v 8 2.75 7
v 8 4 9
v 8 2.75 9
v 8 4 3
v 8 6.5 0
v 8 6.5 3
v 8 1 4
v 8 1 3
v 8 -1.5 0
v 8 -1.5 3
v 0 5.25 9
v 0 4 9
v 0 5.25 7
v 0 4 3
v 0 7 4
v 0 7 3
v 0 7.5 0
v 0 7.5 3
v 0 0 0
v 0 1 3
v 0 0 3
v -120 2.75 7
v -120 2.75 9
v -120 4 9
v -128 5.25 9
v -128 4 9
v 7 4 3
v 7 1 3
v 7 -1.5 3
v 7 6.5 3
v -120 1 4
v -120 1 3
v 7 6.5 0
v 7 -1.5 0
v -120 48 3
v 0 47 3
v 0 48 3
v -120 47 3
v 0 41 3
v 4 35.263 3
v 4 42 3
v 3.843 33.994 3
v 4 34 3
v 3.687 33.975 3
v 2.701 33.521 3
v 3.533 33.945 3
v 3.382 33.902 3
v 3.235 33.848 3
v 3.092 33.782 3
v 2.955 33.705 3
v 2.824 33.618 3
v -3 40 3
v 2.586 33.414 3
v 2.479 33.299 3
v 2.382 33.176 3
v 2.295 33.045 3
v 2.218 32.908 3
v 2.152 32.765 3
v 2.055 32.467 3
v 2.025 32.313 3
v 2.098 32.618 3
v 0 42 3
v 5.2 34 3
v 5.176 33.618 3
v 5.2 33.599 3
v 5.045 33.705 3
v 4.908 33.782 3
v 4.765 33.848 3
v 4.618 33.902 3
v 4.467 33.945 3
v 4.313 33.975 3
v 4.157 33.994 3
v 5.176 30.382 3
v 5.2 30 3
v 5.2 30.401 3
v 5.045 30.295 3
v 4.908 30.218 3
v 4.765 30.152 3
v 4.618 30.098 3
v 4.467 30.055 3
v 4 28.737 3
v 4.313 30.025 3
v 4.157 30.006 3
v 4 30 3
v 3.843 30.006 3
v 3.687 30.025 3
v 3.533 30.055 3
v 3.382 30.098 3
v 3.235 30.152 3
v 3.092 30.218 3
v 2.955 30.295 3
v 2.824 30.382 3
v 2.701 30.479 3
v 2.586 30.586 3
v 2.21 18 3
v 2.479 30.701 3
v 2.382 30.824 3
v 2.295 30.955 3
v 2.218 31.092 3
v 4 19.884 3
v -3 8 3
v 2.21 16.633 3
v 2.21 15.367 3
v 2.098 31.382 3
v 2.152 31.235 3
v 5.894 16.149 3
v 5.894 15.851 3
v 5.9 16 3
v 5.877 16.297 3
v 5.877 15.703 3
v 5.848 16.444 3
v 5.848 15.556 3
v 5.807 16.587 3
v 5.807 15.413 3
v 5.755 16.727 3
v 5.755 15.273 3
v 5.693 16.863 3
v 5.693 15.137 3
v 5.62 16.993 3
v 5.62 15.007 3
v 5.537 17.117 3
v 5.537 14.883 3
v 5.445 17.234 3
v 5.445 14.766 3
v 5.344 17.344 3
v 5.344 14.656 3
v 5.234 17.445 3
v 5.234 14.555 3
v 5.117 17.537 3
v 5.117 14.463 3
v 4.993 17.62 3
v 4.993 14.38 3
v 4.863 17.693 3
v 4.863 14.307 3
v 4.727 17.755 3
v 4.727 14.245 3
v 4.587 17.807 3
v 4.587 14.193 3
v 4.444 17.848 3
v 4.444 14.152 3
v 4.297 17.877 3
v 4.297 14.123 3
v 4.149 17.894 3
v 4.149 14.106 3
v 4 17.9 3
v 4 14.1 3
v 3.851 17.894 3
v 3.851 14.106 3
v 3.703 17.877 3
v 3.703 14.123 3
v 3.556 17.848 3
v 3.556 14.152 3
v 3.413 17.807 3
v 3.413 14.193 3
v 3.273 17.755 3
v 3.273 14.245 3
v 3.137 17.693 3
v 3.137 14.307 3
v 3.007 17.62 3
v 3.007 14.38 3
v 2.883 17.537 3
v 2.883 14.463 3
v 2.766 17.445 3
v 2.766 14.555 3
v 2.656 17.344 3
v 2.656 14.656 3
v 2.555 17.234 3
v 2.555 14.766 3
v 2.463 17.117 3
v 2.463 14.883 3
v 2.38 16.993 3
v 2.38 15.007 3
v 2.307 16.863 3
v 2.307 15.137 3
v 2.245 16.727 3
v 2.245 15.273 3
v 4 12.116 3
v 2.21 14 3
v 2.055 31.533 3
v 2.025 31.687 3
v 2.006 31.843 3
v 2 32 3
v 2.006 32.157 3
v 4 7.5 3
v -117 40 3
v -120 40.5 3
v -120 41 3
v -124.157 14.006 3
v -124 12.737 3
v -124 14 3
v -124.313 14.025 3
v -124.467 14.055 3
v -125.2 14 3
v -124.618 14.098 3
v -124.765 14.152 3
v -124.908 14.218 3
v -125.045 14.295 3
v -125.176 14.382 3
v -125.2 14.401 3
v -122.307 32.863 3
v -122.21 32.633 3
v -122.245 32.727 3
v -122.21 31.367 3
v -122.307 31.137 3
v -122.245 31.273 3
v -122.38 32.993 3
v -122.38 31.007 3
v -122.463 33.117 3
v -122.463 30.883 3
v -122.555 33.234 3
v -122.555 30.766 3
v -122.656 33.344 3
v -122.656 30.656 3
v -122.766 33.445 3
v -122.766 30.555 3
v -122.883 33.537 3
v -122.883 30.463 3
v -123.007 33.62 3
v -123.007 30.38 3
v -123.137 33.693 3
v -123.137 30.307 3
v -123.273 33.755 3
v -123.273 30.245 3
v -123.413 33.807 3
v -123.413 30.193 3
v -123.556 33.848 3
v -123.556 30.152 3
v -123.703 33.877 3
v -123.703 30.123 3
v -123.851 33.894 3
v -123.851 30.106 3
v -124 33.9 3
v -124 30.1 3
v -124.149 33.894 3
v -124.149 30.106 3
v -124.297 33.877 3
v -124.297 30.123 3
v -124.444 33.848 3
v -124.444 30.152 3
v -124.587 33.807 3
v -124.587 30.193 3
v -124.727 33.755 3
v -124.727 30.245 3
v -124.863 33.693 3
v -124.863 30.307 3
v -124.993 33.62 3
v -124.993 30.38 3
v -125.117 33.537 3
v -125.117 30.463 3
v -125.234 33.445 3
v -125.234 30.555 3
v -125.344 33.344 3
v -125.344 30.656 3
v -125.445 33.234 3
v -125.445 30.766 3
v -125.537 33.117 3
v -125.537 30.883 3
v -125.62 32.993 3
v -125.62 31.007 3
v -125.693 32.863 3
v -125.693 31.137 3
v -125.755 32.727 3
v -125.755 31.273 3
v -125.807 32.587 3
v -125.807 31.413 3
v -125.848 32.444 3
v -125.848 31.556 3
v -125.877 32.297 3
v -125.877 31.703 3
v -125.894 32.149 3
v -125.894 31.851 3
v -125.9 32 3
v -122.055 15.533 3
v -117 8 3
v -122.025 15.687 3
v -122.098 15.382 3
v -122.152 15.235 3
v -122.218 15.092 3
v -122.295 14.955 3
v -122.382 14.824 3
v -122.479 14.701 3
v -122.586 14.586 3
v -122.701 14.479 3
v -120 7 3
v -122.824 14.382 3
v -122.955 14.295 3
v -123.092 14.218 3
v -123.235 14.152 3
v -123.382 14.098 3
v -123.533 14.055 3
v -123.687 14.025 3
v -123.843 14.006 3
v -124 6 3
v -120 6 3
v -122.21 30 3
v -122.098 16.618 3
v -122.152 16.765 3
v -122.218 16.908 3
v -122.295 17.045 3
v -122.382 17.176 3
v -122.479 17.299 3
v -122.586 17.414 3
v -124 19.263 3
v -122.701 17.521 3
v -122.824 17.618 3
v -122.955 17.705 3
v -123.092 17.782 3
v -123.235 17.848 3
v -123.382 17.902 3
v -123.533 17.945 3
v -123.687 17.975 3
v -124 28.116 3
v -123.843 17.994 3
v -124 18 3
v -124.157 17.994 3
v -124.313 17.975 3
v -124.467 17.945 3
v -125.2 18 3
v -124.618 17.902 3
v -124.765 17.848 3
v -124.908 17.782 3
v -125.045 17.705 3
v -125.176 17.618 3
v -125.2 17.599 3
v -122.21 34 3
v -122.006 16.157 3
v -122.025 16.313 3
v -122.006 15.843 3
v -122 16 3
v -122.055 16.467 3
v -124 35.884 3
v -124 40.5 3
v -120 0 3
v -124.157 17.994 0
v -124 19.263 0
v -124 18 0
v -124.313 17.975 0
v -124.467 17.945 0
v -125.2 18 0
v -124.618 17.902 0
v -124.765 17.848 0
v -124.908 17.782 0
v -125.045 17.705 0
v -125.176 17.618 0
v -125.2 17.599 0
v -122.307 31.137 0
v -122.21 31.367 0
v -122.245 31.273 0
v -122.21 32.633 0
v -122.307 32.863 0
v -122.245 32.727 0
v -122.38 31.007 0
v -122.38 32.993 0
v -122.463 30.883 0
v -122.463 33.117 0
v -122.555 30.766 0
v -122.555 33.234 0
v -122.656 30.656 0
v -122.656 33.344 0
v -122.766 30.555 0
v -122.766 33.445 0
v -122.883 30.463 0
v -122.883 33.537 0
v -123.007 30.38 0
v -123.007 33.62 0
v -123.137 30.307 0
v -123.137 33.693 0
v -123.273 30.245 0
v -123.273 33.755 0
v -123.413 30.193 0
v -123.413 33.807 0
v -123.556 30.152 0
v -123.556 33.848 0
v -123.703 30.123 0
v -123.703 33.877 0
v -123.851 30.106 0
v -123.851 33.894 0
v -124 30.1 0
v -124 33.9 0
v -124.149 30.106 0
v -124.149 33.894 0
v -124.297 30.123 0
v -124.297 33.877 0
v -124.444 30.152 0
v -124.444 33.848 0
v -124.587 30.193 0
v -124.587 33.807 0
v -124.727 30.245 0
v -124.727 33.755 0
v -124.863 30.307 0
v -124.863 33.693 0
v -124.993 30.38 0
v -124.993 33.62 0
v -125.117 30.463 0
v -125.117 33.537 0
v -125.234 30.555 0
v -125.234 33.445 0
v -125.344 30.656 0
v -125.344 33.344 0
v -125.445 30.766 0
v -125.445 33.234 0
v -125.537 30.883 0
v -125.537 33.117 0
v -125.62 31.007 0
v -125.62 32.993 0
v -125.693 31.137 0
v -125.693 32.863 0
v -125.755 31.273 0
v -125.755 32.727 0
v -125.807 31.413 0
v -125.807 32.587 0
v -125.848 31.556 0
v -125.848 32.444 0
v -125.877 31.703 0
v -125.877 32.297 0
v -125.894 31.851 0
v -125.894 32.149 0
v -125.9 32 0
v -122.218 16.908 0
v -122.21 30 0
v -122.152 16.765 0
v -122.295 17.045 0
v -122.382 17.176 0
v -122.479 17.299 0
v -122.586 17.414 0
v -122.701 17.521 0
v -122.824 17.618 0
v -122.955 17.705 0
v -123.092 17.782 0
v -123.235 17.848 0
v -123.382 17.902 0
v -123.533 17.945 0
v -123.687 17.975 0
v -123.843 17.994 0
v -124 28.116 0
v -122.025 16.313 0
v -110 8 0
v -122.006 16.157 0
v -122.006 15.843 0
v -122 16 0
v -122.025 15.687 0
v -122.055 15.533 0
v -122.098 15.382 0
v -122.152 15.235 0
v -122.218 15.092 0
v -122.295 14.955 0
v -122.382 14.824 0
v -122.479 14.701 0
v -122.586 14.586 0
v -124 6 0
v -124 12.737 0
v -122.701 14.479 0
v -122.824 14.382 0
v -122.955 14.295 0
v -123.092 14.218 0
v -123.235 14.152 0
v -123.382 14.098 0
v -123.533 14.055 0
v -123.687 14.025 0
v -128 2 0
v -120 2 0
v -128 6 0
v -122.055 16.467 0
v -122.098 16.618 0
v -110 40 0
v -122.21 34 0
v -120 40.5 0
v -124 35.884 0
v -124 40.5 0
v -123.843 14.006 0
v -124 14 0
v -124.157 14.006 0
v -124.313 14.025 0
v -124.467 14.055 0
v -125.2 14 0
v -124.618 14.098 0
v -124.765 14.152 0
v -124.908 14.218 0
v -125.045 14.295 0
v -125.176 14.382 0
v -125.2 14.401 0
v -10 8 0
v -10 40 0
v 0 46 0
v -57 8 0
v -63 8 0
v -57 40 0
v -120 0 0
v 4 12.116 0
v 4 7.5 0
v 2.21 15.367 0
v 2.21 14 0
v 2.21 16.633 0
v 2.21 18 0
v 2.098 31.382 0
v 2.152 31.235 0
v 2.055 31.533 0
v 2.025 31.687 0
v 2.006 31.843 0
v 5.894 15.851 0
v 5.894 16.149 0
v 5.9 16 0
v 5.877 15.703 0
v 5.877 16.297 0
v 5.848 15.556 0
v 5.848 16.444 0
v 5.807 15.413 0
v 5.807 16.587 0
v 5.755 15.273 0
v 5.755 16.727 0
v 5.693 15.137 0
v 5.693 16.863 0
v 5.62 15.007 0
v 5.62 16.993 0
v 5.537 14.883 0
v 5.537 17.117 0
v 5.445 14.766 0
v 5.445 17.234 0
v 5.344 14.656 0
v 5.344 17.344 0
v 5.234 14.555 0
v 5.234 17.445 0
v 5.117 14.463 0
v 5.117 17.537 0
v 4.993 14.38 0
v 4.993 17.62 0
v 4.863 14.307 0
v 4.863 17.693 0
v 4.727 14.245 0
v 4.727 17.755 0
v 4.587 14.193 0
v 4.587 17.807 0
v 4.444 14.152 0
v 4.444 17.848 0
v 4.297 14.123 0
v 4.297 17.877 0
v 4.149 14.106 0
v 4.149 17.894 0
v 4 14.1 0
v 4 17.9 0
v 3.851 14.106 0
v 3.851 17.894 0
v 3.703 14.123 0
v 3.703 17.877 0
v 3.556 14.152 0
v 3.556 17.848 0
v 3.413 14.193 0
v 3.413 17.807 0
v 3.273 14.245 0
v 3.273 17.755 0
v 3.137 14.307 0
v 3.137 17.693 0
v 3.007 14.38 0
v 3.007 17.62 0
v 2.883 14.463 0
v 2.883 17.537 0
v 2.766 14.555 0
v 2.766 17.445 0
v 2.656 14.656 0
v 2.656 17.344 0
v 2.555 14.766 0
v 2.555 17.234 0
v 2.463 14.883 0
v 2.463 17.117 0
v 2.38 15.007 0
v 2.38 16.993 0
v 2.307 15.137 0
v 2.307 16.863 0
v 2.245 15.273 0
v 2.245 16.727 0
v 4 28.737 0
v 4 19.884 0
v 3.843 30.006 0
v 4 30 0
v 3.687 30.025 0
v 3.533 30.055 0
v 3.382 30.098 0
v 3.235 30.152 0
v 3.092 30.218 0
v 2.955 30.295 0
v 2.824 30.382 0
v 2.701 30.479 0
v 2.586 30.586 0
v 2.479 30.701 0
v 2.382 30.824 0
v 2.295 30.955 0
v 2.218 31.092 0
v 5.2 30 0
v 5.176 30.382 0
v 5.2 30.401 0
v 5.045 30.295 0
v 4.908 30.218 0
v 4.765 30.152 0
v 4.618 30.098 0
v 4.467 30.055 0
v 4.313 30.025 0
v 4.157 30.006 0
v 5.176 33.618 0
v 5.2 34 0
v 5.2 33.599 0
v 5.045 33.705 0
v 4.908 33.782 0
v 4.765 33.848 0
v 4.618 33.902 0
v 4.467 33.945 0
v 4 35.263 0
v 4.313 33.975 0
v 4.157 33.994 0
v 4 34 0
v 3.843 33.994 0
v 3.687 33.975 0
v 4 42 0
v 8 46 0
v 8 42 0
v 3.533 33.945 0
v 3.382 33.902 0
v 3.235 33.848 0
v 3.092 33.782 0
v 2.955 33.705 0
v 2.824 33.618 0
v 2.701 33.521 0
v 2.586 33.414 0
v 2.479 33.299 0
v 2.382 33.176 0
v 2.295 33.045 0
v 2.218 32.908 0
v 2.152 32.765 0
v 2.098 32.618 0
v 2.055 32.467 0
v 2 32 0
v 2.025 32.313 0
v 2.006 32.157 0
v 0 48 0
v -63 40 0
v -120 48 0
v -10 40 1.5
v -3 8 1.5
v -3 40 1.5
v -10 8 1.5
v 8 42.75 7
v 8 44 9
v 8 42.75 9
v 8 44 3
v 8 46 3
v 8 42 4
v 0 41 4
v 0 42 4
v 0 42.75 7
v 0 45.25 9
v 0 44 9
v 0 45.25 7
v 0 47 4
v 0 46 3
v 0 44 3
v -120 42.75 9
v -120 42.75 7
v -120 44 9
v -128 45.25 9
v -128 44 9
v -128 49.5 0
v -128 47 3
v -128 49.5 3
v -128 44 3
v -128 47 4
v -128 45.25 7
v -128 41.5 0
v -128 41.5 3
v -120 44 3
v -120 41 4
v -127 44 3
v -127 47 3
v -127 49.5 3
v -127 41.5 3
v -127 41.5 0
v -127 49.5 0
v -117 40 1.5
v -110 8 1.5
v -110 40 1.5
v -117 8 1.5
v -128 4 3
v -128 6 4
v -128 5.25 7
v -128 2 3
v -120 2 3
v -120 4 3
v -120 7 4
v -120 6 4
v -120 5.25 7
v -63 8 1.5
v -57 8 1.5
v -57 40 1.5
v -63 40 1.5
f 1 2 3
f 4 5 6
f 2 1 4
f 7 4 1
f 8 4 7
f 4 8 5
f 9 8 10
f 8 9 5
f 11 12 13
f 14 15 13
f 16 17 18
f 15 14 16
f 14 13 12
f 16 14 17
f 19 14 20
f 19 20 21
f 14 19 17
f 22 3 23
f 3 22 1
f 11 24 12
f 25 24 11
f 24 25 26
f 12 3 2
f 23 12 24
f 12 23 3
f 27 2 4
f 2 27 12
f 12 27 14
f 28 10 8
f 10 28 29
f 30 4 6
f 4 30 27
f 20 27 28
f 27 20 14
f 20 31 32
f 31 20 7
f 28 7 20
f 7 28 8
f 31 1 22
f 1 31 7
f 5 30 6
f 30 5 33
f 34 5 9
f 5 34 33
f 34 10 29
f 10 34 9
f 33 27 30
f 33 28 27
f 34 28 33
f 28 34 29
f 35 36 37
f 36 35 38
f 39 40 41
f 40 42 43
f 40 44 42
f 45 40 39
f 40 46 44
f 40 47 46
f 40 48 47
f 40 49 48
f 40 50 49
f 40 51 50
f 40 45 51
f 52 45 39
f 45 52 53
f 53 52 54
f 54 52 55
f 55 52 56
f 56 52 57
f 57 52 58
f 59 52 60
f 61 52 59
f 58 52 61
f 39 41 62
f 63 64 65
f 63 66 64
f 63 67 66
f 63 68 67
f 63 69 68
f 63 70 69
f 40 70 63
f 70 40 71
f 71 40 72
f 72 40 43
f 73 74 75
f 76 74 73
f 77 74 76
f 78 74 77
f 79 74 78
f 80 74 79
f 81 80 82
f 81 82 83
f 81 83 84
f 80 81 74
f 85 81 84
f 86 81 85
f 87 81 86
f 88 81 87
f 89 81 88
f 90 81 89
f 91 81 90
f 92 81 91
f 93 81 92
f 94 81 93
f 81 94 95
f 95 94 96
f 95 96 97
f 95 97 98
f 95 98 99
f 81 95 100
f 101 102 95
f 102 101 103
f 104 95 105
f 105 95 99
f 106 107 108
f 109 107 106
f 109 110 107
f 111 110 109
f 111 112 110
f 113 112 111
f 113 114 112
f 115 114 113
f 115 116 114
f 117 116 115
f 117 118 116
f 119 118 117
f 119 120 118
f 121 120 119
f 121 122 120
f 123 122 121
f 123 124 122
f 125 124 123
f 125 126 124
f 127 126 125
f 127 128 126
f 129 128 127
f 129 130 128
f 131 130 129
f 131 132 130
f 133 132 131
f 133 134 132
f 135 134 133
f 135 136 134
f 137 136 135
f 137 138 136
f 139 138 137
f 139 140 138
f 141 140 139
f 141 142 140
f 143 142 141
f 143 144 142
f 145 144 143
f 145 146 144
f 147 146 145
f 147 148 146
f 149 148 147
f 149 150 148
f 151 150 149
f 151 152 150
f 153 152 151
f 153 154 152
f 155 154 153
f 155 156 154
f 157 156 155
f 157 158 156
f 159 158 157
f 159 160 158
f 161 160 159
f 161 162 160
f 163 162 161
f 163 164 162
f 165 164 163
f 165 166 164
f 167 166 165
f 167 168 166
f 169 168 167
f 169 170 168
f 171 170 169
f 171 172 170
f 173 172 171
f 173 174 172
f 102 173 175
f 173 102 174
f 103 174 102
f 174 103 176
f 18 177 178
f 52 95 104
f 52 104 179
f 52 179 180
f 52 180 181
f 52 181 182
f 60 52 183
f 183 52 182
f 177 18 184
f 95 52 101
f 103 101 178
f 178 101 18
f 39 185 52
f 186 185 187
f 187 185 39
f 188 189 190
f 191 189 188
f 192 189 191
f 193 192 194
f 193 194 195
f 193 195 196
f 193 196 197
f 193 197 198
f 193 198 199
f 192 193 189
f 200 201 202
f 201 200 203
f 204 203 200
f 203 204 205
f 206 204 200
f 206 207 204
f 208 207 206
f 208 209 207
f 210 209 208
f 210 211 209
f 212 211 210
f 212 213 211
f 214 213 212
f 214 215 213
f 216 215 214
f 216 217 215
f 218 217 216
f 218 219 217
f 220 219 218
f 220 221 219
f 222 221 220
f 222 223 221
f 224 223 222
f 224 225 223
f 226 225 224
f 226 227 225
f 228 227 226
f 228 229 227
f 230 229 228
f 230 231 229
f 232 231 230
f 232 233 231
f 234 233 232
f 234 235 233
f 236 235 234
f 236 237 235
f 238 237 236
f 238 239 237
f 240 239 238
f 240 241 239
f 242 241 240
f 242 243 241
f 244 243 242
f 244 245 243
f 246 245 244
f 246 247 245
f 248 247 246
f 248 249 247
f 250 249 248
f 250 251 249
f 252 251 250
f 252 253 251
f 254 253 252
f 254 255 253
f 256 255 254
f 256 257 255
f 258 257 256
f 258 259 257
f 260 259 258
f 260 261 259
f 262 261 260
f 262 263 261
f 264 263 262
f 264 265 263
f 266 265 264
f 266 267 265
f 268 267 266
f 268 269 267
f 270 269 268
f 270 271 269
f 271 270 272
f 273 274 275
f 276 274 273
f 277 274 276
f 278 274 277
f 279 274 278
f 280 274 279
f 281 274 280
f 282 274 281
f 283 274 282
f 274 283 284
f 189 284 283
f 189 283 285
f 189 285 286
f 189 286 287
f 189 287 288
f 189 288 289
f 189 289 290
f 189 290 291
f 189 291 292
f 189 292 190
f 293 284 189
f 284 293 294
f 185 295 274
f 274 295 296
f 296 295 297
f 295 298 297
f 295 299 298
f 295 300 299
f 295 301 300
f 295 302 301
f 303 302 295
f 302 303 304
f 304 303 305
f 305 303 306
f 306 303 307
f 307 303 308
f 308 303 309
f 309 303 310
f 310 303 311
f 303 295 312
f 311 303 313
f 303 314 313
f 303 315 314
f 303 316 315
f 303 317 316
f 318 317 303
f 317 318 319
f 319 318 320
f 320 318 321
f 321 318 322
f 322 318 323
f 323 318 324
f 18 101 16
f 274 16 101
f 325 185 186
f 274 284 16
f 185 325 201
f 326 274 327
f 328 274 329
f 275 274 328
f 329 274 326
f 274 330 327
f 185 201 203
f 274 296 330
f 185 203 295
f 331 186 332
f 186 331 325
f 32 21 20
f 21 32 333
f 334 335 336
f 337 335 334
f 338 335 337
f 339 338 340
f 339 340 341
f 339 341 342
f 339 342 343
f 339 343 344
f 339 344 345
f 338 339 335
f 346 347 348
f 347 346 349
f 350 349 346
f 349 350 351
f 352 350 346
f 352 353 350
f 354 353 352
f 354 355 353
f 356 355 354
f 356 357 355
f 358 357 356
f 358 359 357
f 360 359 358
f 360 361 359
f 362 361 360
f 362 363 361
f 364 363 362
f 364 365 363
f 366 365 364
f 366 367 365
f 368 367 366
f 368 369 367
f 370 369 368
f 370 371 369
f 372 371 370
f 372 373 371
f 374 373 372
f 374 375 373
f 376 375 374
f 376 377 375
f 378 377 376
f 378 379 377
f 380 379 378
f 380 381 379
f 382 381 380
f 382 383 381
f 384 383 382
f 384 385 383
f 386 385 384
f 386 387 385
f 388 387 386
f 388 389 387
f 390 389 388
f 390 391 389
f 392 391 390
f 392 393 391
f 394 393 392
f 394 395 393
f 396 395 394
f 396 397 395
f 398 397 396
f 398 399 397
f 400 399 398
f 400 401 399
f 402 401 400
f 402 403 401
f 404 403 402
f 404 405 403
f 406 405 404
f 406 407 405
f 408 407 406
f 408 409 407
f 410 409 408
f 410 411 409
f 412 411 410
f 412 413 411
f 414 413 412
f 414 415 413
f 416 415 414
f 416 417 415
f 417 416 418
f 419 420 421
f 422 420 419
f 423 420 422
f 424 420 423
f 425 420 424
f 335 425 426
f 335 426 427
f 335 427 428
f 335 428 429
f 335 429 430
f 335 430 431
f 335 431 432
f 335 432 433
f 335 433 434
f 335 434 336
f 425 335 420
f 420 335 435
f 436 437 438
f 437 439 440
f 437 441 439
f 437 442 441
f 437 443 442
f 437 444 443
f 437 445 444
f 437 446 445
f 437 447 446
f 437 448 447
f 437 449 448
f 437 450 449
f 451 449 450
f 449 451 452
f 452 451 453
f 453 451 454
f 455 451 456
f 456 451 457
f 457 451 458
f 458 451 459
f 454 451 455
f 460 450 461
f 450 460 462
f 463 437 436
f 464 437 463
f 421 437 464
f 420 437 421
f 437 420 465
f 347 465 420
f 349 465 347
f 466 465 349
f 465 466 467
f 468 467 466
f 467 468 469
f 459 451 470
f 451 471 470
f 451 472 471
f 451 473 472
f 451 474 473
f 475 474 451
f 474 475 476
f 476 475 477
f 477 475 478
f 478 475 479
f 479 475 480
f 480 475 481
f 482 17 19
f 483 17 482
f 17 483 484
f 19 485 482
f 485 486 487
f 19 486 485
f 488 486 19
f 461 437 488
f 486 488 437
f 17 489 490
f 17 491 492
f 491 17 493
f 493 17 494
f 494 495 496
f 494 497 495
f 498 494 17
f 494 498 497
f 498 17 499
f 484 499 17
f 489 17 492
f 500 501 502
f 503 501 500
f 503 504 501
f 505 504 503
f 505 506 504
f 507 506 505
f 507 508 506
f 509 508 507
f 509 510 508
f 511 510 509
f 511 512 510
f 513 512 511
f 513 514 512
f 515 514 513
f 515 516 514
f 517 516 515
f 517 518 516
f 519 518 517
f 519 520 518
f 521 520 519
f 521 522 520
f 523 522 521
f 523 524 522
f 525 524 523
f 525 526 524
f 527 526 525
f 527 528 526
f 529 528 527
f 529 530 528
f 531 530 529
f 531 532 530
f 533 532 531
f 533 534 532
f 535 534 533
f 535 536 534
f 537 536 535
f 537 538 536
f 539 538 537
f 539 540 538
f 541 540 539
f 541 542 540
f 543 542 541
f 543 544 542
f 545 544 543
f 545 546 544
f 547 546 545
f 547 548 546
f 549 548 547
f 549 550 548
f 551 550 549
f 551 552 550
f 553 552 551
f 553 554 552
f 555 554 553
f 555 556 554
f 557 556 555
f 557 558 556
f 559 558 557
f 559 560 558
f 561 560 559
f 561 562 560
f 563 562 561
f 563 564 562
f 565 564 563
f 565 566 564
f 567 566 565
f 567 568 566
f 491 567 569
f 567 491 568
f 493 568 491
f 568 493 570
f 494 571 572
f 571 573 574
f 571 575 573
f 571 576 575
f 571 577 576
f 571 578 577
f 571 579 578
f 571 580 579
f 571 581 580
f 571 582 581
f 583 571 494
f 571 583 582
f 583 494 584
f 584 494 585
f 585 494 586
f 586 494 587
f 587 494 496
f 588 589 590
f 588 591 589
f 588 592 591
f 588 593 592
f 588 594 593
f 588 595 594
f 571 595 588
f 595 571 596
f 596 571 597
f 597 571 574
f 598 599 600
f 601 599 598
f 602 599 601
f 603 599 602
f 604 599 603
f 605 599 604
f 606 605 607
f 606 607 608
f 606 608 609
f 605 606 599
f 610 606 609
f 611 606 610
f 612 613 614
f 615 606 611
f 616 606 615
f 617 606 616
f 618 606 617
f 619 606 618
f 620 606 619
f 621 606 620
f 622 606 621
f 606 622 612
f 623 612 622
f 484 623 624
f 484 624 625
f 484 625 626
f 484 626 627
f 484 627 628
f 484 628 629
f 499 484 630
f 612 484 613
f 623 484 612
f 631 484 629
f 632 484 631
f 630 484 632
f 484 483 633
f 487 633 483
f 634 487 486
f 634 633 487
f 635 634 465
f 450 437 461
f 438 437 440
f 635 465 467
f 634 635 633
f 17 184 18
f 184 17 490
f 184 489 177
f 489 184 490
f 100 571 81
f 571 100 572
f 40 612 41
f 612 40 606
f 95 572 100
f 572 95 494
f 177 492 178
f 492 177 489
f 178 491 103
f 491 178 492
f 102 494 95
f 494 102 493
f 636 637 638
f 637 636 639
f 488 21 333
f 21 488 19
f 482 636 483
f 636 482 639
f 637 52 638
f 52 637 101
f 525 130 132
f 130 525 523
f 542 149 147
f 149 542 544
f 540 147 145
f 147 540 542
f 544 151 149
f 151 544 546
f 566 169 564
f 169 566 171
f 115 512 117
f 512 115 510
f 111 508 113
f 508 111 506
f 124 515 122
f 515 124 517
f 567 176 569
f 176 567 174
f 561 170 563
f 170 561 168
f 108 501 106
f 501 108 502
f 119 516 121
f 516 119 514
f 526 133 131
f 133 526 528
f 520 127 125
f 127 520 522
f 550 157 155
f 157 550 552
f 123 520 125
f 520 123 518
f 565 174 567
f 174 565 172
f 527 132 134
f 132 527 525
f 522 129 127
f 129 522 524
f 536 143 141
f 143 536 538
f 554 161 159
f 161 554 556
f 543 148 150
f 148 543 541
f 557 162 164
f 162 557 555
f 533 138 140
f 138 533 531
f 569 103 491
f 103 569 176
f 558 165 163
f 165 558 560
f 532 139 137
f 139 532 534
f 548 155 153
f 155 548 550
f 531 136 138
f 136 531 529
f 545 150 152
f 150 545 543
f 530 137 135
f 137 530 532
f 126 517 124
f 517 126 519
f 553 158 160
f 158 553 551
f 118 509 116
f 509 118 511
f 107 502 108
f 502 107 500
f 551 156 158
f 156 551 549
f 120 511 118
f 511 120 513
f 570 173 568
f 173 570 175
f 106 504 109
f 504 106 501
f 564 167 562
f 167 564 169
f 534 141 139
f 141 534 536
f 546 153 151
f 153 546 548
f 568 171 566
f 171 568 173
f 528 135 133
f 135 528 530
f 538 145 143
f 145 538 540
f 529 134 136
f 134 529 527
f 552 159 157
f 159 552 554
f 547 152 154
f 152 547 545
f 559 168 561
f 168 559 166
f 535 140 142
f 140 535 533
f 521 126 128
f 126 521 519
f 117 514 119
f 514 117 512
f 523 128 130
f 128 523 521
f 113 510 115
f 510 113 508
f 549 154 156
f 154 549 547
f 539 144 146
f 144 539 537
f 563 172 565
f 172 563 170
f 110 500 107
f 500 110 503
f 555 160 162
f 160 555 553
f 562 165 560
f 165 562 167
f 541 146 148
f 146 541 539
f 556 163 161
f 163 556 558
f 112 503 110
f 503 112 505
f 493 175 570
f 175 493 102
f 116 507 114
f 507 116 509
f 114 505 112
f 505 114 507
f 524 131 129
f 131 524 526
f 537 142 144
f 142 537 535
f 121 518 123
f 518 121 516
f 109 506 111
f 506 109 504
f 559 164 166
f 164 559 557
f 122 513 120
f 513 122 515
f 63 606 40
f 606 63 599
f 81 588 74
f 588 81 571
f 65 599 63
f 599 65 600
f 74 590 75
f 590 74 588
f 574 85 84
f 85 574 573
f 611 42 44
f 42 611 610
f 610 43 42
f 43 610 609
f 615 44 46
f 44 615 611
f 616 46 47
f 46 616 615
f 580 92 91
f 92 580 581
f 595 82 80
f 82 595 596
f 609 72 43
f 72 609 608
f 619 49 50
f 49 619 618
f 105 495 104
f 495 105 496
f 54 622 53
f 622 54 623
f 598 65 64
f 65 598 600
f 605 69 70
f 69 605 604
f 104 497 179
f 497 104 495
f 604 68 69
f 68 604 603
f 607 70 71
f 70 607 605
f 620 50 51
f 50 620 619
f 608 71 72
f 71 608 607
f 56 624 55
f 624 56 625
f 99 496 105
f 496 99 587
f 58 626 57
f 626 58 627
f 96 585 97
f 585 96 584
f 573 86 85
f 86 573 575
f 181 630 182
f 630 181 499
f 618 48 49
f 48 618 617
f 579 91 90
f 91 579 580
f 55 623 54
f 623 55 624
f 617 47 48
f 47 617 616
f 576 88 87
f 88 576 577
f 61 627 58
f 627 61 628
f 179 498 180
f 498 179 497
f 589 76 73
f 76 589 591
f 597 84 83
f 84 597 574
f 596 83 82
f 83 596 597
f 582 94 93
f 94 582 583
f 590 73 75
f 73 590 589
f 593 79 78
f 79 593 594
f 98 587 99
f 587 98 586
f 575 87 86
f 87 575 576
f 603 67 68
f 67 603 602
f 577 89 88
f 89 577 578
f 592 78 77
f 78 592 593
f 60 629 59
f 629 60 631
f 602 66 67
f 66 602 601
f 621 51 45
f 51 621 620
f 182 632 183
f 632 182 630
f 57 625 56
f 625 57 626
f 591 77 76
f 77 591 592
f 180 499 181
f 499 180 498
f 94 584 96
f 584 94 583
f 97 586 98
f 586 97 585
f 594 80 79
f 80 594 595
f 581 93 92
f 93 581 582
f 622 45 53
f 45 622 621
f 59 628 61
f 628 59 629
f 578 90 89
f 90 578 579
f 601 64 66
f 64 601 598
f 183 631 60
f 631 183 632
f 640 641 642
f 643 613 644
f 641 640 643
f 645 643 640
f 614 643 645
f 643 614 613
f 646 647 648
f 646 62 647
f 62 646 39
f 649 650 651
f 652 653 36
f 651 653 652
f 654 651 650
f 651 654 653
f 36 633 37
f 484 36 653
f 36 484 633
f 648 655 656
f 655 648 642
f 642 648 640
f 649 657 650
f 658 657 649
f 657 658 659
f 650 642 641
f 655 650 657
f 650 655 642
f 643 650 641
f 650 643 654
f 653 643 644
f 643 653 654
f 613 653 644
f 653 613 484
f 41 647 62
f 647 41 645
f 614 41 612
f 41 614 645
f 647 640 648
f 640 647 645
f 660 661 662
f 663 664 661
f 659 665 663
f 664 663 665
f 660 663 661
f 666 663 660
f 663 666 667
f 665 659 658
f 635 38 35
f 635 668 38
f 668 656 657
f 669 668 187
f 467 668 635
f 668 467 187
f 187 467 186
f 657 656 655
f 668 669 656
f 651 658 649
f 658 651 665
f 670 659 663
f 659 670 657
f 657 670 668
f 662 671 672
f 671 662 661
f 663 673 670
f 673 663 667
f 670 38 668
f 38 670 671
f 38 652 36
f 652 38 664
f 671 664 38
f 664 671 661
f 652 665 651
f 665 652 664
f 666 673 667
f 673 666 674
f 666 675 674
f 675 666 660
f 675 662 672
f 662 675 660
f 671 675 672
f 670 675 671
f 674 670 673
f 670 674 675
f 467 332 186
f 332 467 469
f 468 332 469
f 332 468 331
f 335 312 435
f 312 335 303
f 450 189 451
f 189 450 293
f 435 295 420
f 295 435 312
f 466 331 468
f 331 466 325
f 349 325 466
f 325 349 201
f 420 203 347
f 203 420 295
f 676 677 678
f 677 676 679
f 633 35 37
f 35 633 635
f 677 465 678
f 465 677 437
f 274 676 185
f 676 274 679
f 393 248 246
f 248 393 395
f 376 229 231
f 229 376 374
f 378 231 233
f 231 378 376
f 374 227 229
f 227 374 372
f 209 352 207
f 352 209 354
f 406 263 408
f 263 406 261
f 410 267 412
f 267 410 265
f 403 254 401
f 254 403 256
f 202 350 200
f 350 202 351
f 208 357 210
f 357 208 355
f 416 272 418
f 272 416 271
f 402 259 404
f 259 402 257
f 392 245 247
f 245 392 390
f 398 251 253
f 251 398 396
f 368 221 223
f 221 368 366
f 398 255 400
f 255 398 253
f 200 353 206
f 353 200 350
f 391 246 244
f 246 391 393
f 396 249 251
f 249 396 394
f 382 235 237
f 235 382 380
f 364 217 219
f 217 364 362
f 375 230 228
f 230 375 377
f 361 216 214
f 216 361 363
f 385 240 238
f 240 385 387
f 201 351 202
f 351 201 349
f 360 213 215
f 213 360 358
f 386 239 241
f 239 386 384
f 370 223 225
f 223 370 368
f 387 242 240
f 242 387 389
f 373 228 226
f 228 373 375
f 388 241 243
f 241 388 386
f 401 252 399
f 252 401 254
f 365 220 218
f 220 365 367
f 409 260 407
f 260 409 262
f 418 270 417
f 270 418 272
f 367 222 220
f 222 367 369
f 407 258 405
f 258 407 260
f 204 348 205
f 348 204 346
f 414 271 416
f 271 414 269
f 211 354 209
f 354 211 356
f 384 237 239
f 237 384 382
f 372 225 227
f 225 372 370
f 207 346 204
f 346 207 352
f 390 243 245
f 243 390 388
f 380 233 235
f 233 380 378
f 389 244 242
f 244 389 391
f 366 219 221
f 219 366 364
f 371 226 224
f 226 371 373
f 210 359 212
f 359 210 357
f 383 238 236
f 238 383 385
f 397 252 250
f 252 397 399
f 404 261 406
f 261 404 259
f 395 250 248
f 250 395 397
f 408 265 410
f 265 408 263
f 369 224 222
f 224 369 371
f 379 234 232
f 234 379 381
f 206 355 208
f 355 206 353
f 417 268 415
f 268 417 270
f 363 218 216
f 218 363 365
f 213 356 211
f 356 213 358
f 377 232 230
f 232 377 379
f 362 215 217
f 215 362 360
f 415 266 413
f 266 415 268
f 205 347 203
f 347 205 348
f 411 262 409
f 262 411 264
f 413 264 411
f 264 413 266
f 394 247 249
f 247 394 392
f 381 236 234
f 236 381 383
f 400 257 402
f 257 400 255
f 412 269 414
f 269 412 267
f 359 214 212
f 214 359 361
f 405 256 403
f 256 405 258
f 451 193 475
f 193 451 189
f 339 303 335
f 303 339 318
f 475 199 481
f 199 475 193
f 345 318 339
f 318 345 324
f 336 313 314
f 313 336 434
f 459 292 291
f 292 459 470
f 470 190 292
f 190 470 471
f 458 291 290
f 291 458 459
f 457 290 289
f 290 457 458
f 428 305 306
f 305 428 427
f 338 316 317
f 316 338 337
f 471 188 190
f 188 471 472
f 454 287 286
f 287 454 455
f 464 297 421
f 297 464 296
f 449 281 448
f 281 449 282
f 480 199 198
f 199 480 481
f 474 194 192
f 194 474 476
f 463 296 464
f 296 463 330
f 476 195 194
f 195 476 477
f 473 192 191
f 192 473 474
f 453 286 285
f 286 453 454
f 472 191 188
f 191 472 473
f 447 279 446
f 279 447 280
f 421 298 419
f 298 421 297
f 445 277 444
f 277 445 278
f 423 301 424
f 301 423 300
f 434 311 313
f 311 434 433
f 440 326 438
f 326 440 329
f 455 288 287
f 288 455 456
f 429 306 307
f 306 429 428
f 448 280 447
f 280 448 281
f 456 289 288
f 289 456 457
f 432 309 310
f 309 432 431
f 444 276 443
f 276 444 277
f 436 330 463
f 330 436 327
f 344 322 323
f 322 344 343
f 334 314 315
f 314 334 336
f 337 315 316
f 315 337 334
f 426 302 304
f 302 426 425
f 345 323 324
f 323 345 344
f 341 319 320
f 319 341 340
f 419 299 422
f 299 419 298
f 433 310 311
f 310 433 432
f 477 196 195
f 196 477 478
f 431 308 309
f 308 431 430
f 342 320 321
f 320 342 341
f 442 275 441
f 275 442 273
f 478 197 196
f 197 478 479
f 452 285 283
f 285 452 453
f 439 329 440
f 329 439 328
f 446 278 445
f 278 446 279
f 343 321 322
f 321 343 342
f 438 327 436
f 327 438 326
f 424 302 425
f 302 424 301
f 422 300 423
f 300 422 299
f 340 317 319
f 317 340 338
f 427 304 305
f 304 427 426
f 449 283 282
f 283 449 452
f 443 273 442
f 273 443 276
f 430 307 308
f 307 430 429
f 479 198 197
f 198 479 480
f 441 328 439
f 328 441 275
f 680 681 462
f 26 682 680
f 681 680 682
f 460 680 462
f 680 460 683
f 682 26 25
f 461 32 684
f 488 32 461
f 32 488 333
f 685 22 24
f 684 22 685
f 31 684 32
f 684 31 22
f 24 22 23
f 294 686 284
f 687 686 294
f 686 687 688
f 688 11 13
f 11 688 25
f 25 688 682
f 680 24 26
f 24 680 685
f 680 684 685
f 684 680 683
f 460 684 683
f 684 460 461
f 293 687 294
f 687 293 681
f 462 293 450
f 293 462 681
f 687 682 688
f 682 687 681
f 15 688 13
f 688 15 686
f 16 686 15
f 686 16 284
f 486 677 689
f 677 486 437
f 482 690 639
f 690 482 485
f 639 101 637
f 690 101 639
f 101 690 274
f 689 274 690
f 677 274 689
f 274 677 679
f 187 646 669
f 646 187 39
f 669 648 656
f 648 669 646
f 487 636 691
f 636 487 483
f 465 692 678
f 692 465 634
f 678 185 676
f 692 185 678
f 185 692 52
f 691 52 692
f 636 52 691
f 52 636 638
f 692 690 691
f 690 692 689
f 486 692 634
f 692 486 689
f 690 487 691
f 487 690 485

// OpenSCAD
length = 120;

module rail_main(length) {
    poly = [[0,0],[0,8],[3,8],[3,7],[4,7],[7,5.25],[9,5.25],[9,2.75],[7,2.75],[4,1],[3,1],[3,0]];
    rotate([90,-90,180]) linear_extrude(length) polygon(poly);
}

module rail_endpoint_right() {
    poly = [[0,2],[0,6],[3,6],[3,4],[9,4],[9,2.75],[7,2.75],[4,2],[3,2]];
    rotate([90,-90,180]) linear_extrude(8) polygon(poly);
}

module rail_endpoint_left() {
    poly = [[3,8],[3,4],[9,4],[9,2.75],[7,2.75],[4,1],[3,1]];
    rotate([90,-90,180]) linear_extrude(8) polygon(poly);
    // support
    translate([-1.5,0,0]) cube([8,1,3], false);
}

module attach_poly(h) {
    linear_extrude(h) polygon([[0,0],[2,1.9],[6,1.9],[8,0]]);
}

module attach(l) {
    difference() {
        union() {
            cube([41,l,1.5], false);
            cube([41,3,3], false);
            difference() {
                translate ([7.5,-4,0]) cube([36,6,3], false);
                translate ([12,-4.11,-0.5]) attach_poly(4);
            }
            translate ([16,-4,0]) cylinder(3,1.90,1.90,false, $fn = 80);
            translate ([28,-3.3,0]) mirror([0,1,0]) attach_poly(3);
        }
        translate ([32,-4,-0.5]) cylinder(4,2,2,false, $fn = 80);
    }
}

module full_endpoint() {
    translate([0,-8,0]) rail_endpoint_left();
    translate([40,-8,0]) rail_endpoint_right();
    attach(10);
}

module barreau() {
    translate([8,0,0]) cube([36,6,1.5], false);
}

module main() {
    rail_main(length);
    translate([40,0,0]) rail_main(length);

    full_endpoint();

    translate([48,length,0]) rotate([180,180,0]) full_endpoint();

    translate([0,length/2-3,0]) barreau();
}

rotate([0,0,90]) main();
